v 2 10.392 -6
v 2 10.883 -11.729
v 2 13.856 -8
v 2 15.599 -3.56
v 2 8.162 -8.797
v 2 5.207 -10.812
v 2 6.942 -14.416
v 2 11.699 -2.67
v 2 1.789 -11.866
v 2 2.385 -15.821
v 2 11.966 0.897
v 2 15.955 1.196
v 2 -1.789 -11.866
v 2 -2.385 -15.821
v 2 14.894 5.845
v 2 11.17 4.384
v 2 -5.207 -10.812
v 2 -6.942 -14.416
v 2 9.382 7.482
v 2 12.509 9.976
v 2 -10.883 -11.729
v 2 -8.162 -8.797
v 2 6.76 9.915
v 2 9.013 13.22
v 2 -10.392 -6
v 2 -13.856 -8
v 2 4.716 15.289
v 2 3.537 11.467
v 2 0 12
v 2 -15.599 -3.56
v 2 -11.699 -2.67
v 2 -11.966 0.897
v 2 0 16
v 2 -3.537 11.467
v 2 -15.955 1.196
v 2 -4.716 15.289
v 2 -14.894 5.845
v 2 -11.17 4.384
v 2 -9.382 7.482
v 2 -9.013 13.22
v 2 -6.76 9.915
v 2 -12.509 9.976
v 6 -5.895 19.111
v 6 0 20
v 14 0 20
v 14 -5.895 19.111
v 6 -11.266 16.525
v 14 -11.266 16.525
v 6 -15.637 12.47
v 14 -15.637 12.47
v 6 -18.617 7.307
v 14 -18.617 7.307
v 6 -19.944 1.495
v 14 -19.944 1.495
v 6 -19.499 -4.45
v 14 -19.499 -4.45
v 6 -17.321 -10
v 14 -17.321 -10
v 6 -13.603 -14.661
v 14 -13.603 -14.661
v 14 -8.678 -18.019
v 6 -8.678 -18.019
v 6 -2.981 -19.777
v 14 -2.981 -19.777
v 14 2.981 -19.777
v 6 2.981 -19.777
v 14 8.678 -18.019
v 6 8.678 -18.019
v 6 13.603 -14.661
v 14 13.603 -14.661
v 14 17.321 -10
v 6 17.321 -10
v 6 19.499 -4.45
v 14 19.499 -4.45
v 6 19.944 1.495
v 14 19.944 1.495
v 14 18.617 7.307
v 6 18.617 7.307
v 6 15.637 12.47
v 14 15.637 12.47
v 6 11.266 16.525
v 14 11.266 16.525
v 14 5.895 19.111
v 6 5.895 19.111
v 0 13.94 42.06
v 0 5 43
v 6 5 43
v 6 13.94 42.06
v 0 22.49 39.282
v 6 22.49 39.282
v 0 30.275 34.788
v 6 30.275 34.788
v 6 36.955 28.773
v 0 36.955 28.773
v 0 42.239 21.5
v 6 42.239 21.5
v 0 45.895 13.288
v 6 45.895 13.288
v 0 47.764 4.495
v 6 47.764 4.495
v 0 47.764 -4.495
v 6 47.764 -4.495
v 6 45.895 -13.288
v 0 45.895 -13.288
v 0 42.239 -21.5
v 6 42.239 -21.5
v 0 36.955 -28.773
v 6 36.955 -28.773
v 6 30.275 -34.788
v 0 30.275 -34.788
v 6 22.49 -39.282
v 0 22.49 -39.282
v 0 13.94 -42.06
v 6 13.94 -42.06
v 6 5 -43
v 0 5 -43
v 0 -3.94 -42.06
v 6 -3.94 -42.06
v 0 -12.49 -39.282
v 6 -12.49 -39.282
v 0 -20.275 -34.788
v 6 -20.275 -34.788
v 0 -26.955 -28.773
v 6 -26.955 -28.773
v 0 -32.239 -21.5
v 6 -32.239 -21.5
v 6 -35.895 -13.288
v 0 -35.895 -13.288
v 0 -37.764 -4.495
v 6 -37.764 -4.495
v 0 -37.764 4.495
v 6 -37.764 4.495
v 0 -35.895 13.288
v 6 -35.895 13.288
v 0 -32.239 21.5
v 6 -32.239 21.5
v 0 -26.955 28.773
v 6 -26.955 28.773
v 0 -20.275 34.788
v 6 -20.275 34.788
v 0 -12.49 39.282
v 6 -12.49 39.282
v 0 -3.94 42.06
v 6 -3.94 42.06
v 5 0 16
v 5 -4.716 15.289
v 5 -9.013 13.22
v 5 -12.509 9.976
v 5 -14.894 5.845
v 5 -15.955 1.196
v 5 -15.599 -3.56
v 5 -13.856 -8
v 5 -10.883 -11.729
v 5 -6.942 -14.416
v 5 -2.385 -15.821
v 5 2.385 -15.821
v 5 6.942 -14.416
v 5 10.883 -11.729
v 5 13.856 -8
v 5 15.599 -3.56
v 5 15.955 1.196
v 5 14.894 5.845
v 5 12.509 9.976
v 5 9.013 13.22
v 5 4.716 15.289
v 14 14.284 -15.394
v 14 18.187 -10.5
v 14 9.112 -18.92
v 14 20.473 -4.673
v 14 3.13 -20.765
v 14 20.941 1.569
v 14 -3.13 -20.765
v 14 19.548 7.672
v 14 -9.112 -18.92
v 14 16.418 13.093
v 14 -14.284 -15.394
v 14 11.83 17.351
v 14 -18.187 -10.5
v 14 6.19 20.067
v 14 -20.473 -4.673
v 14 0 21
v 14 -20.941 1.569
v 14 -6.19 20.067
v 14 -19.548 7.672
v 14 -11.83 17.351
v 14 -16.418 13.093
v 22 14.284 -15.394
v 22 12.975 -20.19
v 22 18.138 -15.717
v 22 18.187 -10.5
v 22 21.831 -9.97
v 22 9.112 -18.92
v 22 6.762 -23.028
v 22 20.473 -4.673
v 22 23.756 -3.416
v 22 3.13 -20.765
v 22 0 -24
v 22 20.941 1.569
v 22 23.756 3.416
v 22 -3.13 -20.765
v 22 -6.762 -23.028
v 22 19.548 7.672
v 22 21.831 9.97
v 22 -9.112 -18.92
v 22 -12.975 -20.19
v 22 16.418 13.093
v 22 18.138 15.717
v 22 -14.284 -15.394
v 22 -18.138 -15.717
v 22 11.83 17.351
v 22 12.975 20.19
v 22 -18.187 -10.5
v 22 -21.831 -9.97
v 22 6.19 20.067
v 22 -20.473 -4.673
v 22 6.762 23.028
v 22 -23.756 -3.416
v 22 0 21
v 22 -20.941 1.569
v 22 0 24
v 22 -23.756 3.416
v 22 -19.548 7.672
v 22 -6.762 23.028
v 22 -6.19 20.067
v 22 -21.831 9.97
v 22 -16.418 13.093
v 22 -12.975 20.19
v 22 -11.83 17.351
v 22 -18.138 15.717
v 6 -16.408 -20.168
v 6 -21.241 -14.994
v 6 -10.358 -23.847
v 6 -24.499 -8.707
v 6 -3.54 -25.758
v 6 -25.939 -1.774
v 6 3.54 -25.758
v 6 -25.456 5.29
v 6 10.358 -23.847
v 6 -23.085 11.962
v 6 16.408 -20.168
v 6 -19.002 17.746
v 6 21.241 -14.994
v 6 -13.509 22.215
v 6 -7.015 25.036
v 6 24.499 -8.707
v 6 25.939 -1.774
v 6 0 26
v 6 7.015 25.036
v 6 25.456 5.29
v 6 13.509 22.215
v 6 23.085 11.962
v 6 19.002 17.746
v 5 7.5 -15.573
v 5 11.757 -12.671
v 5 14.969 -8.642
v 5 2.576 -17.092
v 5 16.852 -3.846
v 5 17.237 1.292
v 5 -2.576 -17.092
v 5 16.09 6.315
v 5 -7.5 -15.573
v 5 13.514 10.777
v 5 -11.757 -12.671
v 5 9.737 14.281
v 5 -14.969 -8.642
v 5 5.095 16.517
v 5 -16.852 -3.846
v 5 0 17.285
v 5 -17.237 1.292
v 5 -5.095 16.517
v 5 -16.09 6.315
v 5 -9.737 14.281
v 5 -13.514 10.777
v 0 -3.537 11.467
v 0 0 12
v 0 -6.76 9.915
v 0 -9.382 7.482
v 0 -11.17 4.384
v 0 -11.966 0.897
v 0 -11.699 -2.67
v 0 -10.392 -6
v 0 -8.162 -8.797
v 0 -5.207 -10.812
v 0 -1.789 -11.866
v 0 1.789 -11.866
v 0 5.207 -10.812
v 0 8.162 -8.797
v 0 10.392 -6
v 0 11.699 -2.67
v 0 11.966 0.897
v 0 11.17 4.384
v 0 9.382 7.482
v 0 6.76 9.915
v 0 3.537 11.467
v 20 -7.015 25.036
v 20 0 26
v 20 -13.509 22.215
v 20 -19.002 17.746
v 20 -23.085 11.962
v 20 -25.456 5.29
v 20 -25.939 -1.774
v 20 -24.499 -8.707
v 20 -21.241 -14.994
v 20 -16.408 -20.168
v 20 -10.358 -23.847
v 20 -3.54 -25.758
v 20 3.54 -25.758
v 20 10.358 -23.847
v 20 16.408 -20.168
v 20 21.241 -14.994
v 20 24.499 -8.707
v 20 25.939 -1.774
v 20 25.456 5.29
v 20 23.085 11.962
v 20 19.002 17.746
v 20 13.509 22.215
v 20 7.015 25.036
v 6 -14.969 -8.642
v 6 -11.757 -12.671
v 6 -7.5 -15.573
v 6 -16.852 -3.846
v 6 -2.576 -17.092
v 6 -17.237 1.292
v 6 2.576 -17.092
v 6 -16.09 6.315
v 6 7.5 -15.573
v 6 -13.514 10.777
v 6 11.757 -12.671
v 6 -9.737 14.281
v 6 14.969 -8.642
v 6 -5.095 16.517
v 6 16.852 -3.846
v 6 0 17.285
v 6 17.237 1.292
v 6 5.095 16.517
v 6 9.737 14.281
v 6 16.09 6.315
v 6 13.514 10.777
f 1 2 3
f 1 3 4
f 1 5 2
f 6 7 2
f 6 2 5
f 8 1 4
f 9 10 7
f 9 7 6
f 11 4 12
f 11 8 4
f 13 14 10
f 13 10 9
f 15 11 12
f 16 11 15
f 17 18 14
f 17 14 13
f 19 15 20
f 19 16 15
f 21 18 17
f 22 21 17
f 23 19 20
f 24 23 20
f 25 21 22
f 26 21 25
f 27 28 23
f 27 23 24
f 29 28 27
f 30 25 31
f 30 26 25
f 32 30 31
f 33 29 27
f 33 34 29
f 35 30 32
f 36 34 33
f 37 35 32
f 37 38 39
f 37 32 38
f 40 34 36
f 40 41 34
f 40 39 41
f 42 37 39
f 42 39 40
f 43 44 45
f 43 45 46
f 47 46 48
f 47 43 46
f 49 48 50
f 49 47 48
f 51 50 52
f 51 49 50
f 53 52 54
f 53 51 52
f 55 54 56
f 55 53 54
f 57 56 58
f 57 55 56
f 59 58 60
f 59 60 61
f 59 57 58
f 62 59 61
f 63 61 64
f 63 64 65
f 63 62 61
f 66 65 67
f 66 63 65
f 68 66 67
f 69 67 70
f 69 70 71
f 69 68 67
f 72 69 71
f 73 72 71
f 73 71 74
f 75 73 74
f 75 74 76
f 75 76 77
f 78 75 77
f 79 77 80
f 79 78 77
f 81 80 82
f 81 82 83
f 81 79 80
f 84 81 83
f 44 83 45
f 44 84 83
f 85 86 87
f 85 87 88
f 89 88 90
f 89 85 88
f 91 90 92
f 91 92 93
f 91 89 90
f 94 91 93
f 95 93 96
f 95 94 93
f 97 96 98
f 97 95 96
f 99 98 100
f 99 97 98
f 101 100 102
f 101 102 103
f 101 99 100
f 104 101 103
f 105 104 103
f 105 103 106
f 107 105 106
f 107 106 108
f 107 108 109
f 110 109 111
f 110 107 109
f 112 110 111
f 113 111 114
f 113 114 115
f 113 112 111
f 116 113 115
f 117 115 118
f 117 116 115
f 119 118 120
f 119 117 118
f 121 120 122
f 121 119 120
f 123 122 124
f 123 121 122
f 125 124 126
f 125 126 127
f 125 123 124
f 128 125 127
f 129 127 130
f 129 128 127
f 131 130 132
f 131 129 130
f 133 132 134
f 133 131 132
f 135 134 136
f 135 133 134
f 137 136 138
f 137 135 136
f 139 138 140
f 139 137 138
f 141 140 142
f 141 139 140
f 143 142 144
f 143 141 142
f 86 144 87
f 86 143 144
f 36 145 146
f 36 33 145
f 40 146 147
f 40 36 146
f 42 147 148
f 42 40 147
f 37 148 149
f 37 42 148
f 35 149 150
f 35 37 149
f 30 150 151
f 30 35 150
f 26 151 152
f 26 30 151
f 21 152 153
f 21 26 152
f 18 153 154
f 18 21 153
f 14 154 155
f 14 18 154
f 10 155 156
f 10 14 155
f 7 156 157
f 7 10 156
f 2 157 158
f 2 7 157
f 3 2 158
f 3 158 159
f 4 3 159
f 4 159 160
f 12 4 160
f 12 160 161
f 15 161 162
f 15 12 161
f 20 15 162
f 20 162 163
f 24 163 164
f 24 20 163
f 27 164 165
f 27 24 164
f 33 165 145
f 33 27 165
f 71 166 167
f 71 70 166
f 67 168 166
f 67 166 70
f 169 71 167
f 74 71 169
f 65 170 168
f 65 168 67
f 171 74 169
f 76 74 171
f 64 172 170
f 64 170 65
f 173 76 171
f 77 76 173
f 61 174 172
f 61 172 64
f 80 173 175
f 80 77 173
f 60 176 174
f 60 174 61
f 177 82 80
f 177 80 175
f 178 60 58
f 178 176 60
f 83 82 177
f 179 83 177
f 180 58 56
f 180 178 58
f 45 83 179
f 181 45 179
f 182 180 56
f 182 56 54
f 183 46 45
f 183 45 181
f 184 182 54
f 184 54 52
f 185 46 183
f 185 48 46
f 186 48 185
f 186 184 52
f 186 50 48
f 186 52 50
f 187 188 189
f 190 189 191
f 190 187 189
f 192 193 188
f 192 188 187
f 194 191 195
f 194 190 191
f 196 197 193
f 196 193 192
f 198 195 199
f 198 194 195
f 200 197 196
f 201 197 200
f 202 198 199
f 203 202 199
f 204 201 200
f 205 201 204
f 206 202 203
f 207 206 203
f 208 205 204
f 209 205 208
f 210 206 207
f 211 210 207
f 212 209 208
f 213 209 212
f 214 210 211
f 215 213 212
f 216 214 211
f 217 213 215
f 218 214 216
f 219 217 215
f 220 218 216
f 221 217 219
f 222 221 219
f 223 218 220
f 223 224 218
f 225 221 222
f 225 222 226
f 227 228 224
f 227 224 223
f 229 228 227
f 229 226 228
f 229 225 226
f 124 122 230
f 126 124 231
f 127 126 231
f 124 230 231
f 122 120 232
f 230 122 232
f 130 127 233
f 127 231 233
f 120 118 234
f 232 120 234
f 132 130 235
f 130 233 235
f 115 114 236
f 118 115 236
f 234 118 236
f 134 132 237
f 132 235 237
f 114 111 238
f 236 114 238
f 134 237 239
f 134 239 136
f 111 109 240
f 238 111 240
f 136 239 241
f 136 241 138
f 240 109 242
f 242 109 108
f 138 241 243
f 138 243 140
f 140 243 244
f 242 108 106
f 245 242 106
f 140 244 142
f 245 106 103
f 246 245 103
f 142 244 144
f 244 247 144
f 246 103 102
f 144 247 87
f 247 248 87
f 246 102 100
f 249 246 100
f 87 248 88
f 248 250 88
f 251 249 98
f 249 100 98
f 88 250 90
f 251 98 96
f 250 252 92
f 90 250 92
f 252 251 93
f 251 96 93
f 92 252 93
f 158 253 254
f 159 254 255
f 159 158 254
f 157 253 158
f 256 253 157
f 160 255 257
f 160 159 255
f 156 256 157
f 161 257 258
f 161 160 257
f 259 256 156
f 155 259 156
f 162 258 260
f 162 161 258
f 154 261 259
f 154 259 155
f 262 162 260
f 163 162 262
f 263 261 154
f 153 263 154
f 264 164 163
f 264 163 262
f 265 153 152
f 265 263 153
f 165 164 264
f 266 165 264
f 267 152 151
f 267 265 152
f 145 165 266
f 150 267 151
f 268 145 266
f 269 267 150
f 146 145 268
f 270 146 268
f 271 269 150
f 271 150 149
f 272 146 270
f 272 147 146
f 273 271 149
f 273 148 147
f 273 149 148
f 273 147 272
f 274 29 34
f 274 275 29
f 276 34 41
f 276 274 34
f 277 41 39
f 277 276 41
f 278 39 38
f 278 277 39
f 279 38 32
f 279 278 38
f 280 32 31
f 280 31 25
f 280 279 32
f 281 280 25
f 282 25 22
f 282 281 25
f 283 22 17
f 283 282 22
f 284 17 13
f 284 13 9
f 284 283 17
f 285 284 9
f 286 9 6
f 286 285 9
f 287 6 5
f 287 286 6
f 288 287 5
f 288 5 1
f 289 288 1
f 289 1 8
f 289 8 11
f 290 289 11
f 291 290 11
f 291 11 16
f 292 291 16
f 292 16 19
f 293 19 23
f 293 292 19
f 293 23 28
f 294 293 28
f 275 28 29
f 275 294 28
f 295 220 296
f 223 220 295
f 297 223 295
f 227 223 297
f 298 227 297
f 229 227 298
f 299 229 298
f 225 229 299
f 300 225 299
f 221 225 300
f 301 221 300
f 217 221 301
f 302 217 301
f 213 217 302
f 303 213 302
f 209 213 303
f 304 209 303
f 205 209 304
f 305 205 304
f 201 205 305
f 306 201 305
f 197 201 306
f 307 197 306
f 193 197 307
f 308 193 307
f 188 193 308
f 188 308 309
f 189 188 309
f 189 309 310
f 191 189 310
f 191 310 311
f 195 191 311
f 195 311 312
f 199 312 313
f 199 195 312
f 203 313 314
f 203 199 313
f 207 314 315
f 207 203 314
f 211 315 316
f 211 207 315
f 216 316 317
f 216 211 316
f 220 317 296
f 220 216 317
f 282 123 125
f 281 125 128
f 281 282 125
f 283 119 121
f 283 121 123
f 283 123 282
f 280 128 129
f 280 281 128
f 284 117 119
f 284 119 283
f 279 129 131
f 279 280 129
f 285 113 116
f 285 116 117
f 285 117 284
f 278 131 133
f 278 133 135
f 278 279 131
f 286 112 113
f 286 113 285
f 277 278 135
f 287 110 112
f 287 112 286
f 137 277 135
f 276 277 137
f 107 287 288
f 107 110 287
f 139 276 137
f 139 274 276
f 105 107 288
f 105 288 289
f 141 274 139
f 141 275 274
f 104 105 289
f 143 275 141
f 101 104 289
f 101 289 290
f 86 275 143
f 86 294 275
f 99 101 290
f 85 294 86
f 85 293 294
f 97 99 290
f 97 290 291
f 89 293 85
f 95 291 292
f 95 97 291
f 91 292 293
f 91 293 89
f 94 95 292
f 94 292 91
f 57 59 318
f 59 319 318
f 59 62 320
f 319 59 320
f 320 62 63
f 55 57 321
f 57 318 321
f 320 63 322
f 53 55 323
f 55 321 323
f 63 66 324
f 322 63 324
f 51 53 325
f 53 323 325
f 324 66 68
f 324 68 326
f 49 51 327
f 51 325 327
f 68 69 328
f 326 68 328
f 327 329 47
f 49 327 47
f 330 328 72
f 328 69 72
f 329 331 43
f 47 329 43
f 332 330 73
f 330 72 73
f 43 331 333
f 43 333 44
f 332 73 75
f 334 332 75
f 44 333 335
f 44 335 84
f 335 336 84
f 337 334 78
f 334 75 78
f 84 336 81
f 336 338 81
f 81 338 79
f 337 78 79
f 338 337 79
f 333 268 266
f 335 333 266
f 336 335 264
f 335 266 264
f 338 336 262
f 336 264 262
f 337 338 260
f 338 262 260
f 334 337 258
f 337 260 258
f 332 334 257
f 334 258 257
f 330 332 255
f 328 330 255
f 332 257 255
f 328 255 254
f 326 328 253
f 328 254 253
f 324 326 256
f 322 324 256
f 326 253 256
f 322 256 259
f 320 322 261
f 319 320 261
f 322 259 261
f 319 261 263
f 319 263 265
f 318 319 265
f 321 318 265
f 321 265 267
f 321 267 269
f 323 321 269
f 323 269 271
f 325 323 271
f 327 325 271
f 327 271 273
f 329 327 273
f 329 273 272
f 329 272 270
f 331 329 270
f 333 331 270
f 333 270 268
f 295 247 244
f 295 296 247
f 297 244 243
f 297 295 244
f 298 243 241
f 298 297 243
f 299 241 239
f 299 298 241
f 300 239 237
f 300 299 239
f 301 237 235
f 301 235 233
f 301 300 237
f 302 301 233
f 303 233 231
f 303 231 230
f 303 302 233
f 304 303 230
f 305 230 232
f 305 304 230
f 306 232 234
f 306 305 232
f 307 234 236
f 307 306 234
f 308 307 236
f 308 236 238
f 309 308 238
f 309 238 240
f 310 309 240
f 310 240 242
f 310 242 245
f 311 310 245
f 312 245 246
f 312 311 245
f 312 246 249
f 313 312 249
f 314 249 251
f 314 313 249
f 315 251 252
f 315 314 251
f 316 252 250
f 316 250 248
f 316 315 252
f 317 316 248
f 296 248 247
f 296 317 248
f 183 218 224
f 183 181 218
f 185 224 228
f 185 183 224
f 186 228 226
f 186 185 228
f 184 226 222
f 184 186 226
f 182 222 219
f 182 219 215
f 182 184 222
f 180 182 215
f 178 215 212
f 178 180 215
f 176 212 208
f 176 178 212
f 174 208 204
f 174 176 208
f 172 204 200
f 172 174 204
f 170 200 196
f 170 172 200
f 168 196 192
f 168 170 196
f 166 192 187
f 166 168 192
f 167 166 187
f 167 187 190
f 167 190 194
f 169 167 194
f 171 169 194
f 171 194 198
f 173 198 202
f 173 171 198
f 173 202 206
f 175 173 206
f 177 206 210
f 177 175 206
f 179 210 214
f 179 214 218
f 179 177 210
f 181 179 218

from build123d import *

# Parameters (mm, degrees)
ESQUISSE2_R        = 43
ESQUISSE2_R_2      = 17.284931715
BOSS_EXTRU_1_DEPTH = 6


with BuildPart() as part:
    # Esquisse1 → Base-Révolution (revolve)
    with BuildSketch(Plane.XY):
        Polygon((0, 12), (0, 26), (20, 26), (22, 24), (22, 21), (14, 21), (14, 20), (5, 20), (5, 16), (2, 16), (2, 12), align=None)
    revolve(axis=Axis((-4.169000368, 0, 0), (1, 0, 0)))

    # Esquisse2 → Boss.-Extru.1 (add)
    with BuildSketch(Plane.ZY):
        with Locations((0, 5)):
            Circle(ESQUISSE2_R)
        Circle(ESQUISSE2_R_2, mode=Mode.SUBTRACT)
    extrude(amount=-BOSS_EXTRU_1_DEPTH)


solid = part.part
